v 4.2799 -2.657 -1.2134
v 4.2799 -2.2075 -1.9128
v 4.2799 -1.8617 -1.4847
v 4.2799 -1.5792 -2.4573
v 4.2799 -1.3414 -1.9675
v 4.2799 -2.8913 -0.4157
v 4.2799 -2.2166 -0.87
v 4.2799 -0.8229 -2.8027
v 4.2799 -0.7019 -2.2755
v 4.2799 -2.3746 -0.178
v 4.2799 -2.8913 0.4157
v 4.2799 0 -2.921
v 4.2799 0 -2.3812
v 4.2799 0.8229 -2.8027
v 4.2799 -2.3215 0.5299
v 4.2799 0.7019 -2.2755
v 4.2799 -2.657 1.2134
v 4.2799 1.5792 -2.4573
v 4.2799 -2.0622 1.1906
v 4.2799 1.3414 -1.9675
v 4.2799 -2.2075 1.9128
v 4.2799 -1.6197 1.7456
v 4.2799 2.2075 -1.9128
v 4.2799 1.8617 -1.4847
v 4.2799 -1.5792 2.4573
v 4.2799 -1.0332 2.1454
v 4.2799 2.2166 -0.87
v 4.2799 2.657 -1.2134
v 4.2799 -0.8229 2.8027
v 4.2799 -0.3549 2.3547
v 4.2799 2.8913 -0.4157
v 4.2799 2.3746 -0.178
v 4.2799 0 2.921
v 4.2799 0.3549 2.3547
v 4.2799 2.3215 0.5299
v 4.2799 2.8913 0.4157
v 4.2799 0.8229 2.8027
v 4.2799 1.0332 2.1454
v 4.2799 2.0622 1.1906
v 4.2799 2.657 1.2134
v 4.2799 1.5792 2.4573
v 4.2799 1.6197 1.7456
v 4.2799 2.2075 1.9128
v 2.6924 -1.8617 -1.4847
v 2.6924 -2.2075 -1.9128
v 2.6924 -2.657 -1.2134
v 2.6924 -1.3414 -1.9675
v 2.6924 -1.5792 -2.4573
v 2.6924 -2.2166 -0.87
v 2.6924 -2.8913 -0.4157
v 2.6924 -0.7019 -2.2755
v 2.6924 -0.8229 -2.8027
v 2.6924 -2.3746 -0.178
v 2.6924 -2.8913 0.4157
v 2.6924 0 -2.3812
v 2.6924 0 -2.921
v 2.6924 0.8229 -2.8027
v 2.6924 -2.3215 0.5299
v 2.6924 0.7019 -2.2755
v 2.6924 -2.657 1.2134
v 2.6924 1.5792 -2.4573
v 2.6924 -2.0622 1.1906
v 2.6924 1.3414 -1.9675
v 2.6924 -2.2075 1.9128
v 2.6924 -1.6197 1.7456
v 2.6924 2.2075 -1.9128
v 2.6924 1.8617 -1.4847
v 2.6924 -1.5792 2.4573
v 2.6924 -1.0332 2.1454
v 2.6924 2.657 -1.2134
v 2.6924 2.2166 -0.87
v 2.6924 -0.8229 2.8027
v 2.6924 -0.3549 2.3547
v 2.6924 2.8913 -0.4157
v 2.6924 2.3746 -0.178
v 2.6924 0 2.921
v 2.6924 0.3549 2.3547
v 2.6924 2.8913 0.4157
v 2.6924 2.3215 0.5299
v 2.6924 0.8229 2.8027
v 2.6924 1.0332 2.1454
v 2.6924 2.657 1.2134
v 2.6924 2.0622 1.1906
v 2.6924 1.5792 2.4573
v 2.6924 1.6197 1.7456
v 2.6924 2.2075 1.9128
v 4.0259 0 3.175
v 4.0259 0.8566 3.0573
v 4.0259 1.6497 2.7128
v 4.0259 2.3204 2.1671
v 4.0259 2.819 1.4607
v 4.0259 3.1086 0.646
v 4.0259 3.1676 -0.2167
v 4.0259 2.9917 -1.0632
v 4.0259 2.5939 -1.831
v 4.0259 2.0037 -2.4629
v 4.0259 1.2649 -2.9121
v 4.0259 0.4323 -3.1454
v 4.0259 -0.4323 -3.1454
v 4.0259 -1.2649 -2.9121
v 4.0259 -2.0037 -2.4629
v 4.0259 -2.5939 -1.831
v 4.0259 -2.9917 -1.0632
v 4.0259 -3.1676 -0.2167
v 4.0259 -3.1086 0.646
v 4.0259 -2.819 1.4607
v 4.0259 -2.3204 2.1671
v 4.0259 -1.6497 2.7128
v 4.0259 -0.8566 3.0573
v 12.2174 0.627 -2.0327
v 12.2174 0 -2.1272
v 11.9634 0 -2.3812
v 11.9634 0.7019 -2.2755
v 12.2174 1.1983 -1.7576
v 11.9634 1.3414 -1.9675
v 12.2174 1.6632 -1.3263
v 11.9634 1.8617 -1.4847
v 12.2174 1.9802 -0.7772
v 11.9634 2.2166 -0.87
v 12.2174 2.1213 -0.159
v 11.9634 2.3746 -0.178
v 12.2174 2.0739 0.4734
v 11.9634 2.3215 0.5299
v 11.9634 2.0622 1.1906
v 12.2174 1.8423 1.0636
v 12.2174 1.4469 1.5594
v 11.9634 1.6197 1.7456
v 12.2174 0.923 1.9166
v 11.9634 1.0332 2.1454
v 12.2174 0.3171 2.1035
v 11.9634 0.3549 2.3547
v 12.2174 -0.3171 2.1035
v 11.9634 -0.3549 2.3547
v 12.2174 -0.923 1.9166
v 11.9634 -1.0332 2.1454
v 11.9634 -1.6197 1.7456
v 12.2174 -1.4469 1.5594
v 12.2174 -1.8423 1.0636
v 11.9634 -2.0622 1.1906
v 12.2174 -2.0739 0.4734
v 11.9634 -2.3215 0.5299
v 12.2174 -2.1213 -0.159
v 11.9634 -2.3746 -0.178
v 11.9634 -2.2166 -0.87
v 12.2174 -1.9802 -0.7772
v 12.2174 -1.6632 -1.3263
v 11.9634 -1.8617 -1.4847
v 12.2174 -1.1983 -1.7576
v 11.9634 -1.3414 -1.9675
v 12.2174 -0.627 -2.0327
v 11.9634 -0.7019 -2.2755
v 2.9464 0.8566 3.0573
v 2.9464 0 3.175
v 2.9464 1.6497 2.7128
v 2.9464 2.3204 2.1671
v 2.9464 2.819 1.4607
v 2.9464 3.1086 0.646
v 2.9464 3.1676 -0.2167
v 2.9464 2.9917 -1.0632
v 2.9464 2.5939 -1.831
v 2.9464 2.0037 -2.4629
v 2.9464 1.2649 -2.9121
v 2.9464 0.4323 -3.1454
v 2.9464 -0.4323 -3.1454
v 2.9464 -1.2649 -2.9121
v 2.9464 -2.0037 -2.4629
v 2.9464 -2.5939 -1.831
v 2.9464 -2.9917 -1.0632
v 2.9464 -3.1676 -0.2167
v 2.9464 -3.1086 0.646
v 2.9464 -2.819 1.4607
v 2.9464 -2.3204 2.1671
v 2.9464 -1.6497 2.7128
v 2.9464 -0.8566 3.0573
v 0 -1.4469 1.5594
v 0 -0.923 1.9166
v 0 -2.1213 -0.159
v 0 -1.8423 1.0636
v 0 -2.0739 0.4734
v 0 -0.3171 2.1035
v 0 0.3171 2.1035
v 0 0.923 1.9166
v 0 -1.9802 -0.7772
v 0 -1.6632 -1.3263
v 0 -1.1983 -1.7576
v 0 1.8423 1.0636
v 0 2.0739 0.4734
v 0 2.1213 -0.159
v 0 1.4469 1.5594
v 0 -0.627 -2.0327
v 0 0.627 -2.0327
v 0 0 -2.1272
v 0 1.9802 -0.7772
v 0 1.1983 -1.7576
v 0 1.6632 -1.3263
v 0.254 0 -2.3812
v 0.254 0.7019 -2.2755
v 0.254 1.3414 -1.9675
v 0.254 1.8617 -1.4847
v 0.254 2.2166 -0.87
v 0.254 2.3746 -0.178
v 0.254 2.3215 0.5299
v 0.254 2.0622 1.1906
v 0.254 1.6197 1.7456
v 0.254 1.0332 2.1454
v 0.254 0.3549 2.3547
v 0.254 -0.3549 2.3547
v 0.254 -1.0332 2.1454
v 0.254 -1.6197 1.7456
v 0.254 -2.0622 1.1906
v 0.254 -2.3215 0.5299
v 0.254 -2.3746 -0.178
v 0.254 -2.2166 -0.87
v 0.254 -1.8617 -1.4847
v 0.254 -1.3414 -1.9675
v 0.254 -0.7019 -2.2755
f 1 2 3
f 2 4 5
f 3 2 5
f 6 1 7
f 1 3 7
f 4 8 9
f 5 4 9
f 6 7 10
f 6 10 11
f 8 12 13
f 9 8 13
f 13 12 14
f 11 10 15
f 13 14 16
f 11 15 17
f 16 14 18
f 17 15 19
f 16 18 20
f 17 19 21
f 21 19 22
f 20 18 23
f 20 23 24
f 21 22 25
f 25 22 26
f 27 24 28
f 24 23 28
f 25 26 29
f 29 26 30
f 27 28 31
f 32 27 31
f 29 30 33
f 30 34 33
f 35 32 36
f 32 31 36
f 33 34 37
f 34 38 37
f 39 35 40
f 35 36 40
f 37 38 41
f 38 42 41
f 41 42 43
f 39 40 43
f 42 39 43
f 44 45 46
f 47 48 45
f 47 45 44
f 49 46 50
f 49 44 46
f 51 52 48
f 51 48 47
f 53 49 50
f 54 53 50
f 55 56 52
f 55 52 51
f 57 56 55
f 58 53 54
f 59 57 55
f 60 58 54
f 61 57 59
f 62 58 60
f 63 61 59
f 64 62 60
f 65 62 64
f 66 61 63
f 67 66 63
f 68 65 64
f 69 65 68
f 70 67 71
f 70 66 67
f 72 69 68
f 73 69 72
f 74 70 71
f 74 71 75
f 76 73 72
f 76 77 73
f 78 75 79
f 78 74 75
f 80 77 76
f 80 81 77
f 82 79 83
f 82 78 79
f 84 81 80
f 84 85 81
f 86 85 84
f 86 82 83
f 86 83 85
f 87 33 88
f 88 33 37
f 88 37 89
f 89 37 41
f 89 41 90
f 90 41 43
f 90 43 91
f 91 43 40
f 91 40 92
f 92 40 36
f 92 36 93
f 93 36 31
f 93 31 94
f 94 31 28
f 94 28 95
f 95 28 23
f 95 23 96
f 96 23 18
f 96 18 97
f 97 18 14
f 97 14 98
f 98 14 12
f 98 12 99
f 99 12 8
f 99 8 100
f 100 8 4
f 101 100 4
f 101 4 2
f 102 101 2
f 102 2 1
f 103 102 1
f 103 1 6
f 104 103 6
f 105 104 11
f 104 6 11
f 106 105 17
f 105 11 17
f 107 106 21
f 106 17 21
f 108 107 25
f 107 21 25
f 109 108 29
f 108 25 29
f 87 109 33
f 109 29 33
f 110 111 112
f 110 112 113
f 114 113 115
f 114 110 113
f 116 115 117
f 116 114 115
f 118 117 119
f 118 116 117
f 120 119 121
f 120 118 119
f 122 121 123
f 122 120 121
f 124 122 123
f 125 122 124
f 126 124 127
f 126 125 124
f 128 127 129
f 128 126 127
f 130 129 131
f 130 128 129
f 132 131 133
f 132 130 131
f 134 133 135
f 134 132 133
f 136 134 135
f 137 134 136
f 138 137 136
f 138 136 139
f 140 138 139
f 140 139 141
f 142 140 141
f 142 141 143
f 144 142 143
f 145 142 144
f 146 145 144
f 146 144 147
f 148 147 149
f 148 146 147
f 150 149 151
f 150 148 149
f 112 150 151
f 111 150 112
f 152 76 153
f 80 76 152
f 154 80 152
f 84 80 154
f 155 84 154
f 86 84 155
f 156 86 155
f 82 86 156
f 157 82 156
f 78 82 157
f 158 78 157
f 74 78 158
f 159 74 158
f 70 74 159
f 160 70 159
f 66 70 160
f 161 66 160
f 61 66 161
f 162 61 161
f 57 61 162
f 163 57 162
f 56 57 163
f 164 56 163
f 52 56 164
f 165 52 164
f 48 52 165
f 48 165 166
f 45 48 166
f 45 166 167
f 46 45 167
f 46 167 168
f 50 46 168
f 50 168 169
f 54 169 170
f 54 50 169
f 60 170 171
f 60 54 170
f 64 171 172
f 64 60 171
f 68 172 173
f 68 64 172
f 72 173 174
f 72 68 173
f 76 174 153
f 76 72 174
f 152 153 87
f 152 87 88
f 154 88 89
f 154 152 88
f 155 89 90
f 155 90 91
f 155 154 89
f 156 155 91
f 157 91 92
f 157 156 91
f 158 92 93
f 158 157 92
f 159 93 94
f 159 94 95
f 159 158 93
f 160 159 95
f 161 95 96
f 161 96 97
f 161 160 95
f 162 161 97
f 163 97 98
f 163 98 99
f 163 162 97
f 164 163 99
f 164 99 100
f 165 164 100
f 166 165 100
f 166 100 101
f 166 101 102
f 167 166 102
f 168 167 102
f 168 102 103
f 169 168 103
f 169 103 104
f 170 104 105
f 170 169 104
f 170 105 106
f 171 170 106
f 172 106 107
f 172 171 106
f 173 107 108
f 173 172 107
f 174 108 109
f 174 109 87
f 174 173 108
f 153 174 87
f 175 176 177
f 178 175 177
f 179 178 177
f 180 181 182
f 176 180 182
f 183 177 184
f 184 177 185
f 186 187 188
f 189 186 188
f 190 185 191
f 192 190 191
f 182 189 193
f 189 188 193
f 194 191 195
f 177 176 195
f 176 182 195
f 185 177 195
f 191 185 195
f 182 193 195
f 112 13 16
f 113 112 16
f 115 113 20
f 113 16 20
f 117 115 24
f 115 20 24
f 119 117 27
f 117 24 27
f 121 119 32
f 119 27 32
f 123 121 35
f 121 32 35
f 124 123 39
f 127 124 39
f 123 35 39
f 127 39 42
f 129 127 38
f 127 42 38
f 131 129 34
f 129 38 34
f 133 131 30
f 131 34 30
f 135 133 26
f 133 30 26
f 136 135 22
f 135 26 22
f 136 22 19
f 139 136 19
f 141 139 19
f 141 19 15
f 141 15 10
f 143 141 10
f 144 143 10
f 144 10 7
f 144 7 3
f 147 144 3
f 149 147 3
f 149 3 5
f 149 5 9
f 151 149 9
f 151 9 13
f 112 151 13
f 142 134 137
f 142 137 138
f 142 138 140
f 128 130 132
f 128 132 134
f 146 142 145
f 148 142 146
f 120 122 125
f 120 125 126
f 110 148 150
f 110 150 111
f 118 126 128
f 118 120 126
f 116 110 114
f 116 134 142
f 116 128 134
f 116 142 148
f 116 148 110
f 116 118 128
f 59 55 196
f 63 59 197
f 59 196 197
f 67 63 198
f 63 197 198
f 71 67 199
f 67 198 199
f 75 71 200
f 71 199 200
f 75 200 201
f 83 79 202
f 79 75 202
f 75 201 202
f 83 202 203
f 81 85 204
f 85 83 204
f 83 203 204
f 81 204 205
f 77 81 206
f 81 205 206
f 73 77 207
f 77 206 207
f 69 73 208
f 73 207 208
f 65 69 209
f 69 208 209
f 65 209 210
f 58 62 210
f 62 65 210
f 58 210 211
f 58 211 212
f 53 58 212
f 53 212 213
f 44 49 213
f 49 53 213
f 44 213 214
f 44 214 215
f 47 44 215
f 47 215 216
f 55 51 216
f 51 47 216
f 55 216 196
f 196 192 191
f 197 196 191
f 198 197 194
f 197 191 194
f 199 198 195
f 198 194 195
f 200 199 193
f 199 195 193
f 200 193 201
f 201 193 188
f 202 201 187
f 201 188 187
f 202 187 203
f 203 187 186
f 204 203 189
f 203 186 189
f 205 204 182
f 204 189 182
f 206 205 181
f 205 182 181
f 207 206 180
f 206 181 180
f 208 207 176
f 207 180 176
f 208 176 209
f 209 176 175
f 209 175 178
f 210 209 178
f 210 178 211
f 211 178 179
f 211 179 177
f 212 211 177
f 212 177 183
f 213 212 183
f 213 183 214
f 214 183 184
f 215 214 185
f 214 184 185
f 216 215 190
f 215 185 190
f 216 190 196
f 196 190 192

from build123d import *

# Parameters (mm, degrees)
SKETCH1_R           = 2.38125
BOSS_EXTRUDE1_DEPTH = 12.2174
SKETCH2_R           = 3.175
BOSS_EXTRUDE2_DEPTH = 1.5875
CHAMFER1_SIZE       = 0.254


with BuildPart() as part:
    # Sketch1 → Boss-Extrude1 (new body)
    with BuildSketch(Plane(origin=(0, 0, 0), x_dir=(0, 0, -1), z_dir=(1, 0, 0))):
        Circle(SKETCH1_R)
    extrude(amount=BOSS_EXTRUDE1_DEPTH)

    # Sketch2 → Boss-Extrude2 (add)
    with BuildSketch(Plane.ZY.offset(-2.6924)):
        Circle(SKETCH2_R)
    extrude(amount=-BOSS_EXTRUDE2_DEPTH)

    # Chamfer1
    chamfer1_edges = [part.edges().sort_by_distance(p)[0] for p in [
        (0, 0, 2.38125),
        (12.2174, 0, 2.38125),
        (2.6924, 0, -3.175),
        (4.2799, 0, -3.175),
    ]]
    chamfer(chamfer1_edges, length=CHAMFER1_SIZE)


solid = part.part
